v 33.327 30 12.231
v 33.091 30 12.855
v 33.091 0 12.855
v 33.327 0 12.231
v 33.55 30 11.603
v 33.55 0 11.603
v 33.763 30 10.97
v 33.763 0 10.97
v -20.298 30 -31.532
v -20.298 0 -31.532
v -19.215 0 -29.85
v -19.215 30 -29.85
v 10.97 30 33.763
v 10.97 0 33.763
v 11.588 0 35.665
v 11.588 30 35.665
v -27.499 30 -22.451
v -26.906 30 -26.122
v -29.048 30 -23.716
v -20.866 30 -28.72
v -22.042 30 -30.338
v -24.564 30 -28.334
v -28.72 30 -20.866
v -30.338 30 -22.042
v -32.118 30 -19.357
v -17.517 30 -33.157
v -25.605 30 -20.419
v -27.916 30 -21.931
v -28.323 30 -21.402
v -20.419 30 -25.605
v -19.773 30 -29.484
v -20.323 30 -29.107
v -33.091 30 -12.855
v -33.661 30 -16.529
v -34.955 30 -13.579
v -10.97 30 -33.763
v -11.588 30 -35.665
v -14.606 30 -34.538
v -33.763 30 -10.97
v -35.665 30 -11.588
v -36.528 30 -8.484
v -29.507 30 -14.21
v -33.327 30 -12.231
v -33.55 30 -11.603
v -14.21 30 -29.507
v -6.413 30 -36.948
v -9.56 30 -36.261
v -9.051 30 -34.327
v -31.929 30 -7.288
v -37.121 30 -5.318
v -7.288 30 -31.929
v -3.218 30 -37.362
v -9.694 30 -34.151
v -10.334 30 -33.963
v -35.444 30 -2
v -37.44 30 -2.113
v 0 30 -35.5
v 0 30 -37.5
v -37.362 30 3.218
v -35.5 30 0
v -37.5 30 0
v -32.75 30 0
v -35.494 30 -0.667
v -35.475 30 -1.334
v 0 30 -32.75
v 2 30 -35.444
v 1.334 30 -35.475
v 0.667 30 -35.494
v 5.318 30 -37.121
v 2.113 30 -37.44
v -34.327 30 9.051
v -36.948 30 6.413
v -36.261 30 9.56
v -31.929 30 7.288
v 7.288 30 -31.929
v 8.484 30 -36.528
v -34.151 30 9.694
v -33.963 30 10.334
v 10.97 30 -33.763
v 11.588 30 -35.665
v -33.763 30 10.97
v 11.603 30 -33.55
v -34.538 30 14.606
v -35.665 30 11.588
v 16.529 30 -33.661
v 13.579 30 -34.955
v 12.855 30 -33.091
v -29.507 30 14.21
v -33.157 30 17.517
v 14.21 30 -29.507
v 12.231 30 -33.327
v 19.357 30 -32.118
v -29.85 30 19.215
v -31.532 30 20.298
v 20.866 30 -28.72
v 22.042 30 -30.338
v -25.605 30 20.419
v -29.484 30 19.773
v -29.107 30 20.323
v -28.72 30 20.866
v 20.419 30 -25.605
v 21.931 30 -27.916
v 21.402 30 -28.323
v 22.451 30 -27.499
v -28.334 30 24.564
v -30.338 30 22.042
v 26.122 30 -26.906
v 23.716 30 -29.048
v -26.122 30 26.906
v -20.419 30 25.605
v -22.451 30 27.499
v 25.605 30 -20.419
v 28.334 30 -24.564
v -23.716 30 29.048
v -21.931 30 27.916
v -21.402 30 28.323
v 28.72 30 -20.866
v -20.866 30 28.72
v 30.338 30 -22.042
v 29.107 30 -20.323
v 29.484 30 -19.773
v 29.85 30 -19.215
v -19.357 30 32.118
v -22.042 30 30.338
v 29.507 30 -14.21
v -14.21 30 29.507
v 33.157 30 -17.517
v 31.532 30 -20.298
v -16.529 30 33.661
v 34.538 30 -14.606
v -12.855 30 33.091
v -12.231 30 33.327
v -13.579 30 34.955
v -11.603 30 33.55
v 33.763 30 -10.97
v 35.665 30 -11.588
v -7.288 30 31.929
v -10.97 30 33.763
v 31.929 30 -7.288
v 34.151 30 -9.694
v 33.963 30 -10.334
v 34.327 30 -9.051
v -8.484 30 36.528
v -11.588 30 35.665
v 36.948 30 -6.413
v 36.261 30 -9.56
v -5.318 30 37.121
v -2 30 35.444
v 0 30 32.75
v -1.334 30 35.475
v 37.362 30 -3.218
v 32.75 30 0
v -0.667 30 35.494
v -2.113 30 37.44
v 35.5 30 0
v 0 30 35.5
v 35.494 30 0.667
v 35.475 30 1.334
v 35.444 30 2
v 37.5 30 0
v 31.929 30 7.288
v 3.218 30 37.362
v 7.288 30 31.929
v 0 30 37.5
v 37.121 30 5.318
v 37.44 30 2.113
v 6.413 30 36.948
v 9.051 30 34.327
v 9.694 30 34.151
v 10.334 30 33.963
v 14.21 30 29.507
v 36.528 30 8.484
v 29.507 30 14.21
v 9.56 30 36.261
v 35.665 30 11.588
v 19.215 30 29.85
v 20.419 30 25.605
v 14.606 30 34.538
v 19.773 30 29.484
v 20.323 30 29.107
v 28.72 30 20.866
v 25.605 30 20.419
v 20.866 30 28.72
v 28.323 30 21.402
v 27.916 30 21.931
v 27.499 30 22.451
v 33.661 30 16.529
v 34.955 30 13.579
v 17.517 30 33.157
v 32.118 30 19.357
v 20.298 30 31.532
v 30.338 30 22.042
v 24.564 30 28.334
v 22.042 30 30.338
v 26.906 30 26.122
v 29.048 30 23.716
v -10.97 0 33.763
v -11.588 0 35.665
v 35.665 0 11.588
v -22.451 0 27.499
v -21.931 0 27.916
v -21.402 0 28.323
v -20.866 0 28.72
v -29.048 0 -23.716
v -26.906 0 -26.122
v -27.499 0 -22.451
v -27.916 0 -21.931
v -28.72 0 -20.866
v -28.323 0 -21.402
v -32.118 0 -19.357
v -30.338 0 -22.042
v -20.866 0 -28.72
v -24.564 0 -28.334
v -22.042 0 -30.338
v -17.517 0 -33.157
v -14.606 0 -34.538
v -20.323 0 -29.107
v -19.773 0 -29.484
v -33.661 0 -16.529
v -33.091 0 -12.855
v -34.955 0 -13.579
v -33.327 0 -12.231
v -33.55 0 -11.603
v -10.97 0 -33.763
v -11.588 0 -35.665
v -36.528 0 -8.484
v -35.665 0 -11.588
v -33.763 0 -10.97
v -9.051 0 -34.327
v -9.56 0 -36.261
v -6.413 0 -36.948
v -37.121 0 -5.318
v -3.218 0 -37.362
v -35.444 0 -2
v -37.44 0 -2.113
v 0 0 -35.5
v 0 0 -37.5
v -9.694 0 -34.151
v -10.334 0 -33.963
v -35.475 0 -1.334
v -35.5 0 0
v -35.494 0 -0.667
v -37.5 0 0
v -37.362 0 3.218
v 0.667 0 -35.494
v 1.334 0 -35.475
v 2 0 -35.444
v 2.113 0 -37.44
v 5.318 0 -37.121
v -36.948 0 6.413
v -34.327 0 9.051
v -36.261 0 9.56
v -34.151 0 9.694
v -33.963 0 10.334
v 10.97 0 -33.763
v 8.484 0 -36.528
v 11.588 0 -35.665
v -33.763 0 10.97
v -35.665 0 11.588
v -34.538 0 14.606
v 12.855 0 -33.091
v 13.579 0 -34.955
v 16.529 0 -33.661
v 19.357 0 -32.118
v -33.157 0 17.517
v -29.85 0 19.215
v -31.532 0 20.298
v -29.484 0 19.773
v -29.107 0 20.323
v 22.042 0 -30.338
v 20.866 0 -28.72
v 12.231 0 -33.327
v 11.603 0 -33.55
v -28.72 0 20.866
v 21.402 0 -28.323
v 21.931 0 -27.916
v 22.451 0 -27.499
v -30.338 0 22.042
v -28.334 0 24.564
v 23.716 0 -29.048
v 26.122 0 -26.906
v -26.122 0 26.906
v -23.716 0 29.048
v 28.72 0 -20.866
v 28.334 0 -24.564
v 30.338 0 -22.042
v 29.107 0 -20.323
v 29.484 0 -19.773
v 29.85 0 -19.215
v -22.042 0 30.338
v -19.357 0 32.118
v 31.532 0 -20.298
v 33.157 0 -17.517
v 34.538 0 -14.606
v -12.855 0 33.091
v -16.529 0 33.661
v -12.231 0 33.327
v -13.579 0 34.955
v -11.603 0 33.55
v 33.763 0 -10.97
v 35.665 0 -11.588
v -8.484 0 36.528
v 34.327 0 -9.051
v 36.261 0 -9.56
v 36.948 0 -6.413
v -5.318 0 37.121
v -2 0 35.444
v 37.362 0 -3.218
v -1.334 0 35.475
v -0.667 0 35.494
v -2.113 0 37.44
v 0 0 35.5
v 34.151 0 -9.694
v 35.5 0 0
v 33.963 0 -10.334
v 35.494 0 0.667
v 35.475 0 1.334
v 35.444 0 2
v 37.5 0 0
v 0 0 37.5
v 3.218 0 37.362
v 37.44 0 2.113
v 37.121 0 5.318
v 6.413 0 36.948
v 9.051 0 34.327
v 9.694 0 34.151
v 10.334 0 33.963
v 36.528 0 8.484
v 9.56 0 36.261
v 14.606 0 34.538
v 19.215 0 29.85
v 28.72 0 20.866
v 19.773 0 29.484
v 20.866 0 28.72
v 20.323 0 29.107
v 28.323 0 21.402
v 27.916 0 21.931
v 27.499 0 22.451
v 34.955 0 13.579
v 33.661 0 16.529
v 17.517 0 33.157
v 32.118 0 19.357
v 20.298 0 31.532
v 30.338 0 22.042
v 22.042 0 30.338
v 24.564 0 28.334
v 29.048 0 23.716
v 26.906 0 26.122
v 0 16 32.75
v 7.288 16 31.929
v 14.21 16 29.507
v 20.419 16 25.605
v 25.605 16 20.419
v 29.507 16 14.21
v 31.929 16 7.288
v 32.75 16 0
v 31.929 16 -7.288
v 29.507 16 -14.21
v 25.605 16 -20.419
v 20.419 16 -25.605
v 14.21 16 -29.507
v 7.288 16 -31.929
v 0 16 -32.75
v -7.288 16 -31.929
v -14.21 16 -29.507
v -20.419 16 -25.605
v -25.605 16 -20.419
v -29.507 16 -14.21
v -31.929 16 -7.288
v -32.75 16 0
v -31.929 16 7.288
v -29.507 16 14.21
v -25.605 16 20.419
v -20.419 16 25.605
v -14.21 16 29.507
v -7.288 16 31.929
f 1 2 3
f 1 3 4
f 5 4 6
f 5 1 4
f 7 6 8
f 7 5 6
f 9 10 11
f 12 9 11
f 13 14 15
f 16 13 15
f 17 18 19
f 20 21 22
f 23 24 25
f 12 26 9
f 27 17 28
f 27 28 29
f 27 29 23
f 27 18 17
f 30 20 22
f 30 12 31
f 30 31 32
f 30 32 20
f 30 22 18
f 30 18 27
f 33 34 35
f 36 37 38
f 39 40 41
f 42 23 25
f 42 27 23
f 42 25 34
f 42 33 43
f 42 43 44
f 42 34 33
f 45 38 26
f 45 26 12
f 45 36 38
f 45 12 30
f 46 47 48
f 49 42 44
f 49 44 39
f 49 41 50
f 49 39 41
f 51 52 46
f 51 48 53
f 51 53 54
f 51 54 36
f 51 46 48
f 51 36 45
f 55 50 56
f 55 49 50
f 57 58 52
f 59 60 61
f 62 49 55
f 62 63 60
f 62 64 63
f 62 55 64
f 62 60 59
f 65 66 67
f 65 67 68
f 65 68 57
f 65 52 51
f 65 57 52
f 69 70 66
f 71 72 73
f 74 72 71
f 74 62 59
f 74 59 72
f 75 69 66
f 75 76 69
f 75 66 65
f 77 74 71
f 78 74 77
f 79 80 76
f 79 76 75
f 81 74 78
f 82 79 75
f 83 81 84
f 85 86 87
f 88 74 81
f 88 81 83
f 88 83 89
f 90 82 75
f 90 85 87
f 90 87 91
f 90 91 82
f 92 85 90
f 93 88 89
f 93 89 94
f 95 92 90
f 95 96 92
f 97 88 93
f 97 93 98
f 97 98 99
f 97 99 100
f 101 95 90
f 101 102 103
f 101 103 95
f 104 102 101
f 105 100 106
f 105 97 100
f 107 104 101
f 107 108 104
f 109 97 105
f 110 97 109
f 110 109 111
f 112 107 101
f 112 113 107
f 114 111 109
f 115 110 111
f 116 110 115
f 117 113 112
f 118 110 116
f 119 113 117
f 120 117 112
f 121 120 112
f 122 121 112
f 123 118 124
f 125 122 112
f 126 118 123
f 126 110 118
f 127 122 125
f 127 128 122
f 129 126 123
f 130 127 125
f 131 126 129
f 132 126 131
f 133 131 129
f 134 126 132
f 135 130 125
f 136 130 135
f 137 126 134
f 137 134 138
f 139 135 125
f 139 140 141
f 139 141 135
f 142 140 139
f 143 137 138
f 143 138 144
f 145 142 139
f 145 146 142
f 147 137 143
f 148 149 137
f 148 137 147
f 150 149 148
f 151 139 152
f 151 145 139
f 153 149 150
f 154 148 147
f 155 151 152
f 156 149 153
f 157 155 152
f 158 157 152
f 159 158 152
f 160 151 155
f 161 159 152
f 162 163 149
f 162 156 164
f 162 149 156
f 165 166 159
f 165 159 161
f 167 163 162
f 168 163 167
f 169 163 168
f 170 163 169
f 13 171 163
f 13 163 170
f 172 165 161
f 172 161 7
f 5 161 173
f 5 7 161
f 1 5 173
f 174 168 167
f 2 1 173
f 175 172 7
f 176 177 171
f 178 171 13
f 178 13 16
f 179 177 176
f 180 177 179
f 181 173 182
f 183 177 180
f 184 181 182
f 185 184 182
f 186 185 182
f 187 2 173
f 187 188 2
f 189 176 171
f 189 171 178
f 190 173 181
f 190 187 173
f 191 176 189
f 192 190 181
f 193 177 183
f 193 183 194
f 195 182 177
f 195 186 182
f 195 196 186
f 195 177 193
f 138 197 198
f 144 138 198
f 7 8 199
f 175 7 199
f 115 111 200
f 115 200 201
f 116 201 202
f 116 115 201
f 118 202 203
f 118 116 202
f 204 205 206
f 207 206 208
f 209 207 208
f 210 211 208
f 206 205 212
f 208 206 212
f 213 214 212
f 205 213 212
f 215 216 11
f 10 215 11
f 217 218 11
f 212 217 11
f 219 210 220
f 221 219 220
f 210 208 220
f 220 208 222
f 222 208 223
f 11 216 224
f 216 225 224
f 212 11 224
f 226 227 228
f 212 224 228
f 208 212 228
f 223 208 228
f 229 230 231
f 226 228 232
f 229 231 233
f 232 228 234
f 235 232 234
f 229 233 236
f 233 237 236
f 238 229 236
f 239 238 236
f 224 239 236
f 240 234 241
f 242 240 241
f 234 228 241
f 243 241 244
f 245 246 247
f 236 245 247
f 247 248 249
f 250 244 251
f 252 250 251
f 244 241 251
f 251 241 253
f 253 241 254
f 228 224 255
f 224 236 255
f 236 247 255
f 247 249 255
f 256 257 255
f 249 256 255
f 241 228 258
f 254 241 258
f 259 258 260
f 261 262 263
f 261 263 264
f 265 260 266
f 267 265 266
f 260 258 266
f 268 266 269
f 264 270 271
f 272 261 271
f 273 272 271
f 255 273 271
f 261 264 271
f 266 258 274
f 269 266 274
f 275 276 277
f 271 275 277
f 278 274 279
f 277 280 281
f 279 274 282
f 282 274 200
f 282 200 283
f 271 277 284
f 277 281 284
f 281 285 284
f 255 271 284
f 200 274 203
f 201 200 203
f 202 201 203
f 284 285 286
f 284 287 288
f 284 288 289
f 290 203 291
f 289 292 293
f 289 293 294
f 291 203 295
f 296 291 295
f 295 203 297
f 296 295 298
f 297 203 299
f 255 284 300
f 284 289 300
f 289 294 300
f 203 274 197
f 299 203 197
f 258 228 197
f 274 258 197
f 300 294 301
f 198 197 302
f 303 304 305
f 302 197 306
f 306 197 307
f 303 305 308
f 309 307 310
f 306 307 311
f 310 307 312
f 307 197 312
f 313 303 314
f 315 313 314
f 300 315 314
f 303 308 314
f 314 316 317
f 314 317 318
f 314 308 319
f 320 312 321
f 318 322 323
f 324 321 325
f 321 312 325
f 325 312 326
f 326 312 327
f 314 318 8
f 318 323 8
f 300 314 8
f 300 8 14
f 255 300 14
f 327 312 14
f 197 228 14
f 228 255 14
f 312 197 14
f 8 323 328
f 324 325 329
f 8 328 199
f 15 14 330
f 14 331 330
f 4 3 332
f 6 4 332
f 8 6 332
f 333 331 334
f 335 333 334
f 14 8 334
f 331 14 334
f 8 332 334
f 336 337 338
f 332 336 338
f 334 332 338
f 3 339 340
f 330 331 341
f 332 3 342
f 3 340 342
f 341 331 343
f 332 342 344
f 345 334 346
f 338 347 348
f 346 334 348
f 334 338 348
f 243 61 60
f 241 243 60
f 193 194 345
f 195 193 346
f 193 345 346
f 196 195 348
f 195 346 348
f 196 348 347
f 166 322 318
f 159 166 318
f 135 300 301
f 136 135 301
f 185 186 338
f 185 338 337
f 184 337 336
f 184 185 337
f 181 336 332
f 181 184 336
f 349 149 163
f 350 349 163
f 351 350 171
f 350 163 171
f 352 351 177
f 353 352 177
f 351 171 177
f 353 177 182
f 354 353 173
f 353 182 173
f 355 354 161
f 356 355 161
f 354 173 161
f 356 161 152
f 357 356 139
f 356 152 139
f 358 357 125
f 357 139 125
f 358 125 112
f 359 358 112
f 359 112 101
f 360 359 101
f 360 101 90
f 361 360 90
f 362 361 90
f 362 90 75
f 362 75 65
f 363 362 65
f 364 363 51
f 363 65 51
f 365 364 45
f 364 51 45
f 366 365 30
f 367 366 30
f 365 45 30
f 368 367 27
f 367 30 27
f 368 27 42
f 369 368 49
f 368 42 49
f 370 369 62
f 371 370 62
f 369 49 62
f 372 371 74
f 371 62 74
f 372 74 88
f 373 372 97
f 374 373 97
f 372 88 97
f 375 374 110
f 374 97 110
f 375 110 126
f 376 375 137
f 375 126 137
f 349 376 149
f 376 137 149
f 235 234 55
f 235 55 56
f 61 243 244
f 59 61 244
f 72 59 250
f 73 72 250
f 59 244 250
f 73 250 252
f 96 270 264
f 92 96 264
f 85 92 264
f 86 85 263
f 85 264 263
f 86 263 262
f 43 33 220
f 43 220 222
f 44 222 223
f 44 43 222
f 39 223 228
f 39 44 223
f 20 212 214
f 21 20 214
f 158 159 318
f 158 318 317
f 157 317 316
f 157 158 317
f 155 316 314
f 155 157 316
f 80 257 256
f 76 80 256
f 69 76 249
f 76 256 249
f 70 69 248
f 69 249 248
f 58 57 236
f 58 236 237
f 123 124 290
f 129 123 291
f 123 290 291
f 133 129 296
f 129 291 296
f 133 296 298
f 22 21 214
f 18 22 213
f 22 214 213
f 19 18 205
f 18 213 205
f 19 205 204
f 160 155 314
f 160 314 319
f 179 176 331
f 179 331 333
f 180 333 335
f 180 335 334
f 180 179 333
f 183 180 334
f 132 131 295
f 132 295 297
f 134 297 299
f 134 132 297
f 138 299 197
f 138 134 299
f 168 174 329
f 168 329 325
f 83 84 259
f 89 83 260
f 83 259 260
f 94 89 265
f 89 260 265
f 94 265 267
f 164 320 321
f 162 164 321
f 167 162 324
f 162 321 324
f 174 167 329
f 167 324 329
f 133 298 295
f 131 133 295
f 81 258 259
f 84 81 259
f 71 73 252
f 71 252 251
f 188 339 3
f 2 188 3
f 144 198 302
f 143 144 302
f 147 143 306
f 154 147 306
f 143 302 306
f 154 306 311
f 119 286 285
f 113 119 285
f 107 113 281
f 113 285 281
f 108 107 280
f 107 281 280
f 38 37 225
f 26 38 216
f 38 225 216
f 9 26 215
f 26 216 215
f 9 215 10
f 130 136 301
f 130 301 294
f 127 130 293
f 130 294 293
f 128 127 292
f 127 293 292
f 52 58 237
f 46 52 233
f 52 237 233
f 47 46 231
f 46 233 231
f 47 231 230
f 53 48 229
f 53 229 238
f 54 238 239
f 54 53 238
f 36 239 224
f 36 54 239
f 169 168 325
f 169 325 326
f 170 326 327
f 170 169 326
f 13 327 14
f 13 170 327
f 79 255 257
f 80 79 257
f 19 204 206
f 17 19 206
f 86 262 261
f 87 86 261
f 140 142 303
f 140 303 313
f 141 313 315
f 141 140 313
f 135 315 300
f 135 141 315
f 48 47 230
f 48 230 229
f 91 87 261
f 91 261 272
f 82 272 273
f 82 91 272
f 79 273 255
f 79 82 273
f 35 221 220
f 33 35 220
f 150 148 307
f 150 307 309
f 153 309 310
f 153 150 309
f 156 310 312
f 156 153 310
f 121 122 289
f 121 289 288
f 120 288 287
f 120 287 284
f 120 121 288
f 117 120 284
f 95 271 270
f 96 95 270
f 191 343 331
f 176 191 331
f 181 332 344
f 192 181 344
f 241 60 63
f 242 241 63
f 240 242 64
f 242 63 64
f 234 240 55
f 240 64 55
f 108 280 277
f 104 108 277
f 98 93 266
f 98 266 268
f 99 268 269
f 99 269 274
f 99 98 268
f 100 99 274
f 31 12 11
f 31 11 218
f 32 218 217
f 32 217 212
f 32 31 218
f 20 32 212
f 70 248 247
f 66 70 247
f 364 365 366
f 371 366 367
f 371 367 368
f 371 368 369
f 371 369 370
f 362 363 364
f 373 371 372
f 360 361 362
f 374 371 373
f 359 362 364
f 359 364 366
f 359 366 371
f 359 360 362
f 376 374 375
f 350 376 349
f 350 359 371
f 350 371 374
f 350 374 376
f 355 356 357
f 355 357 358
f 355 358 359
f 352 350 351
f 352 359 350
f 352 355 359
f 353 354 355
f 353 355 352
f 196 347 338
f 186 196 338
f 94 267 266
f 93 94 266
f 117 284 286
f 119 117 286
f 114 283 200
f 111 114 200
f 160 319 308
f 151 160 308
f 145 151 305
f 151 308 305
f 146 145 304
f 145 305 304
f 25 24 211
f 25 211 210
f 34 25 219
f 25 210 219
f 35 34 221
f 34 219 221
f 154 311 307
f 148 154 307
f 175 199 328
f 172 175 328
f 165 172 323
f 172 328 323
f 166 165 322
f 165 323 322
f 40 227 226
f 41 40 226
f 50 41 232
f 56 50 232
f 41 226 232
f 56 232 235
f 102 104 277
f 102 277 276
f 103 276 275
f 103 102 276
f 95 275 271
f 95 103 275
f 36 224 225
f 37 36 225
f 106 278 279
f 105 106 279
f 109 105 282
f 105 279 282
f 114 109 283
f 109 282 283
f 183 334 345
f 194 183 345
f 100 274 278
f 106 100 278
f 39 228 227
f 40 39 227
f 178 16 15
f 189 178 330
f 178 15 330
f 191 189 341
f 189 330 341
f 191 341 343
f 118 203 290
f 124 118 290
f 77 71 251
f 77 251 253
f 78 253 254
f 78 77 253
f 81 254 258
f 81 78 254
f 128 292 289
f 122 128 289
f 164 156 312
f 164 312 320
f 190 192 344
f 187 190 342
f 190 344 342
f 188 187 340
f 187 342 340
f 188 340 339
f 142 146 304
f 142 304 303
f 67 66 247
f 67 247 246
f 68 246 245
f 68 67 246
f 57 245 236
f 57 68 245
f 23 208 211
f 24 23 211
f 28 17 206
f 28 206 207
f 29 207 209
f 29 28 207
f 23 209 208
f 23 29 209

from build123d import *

# Parameters (mm, degrees)
SKETCH_1_R          = 37.5
EXTRUDE_1_DEPTH     = 30
SKETCH_2_R          = 32.75
CUT_EXTRUDE_1_DEPTH = 14
CUT_EXTRUDE_2_DEPTH = 61.930288035


with BuildPart() as part:
    # 草图1 → 凸台-拉伸1 (new body)
    with BuildSketch(Plane(origin=(0, 0, 0), x_dir=(1, 0, 0), z_dir=(0, 1, 0))):
        with Locations(Location((0, 0, 0), (0, 0, 270))):
            Circle(SKETCH_1_R)
    extrude(amount=EXTRUDE_1_DEPTH)

    # 草图2 → 切除-拉伸1 (cut)
    with BuildSketch(Plane(origin=(0, 30, 0), x_dir=(1, 0, 0), z_dir=(0, 1, 0))):
        with Locations(Location((0, 0, 0), (0, 0, 270))):
            Circle(SKETCH_2_R)
    extrude(amount=-CUT_EXTRUDE_1_DEPTH, mode=Mode.SUBTRACT)

    # 草图3 → 切除-拉伸2 (cut, through all)
    with BuildSketch(Plane(origin=(0, 30, 0), x_dir=(1, 0, 0), z_dir=(0, 1, 0))):
        with BuildLine():
            Line((-35.443617197, 2), (-37.440440701, 2.112676056))
            ThreePointArc((-37.440440701, 2.112676056), (-37.485107218, 1.05675771), (-37.5, 0))
            Line((-37.5, 0), (-35.5, 0))
            ThreePointArc((-35.5, 0), (-35.4859015, 1.000397299), (-35.443617197, 2))
        make_face()
        with BuildLine():
            Line((-33.762506328, 10.9701033), (-35.664619361, 11.588137289))
            ThreePointArc((-35.664619361, 11.588137289), (-35.323899392, 12.588571472), (-34.955122297, 13.579006784))
            Line((-34.955122297, 13.579006784), (-33.090849107, 12.854793089))
            ThreePointArc((-33.090849107, 12.854793089), (-33.439958091, 11.917180994), (-33.762506328, 10.9701033))
        make_face()
        with BuildLine():
            Line((-28.7201033, 20.866376456), (-30.338137289, 22.041946961))
            ThreePointArc((-30.338137289, 22.041946961), (-29.704942178, 22.88812815), (-29.048152975, 23.716129717))
            Line((-29.048152975, 23.716129717), (-27.49891815, 22.451269465))
            ThreePointArc((-27.49891815, 22.451269465), (-28.120678595, 21.667427982), (-28.7201033, 20.866376456))
        make_face()
        with BuildLine():
            Line((-20.866376456, 28.7201033), (-22.041946961, 30.338137289))
            ThreePointArc((-22.041946961, 30.338137289), (-21.178258257, 30.947235372), (-20.29774805, 31.531752633))
            Line((-20.29774805, 31.531752633), (-19.215201487, 29.850059159))
            ThreePointArc((-19.215201487, 29.850059159), (-20.04875115, 29.296716153), (-20.866376456, 28.7201033))
        make_face()
        with BuildLine():
            Line((-10.9701033, 33.762506328), (-11.588137289, 35.664619361))
            ThreePointArc((-11.588137289, 35.664619361), (-10.57849886, 35.977011575), (-9.560458123, 36.260827907))
            Line((-9.560458123, 36.260827907), (-9.050567023, 34.326917085))
            ThreePointArc((-9.050567023, 34.326917085), (-10.014312254, 34.058237624), (-10.9701033, 33.762506328))
        make_face()
        with BuildLine():
            Line((0, 35.5), (0, 37.5))
            ThreePointArc((0, 37.5), (1.05675771, 37.485107218), (2.112676056, 37.440440701))
            Line((2.112676056, 37.440440701), (2, 35.443617197))
            ThreePointArc((2, 35.443617197), (1.000397299, 35.4859015), (0, 35.5))
        make_face()
        with BuildLine():
            Line((10.9701033, 33.762506328), (11.588137289, 35.664619361))
            ThreePointArc((11.588137289, 35.664619361), (12.588571472, 35.323899392), (13.579006784, 34.955122297))
            Line((13.579006784, 34.955122297), (12.854793089, 33.090849107))
            ThreePointArc((12.854793089, 33.090849107), (11.917180994, 33.439958091), (10.9701033, 33.762506328))
        make_face()
        with BuildLine():
            Line((20.866376456, 28.7201033), (22.041946961, 30.338137289))
            ThreePointArc((22.041946961, 30.338137289), (22.88812815, 29.704942178), (23.716129717, 29.048152975))
            Line((23.716129717, 29.048152975), (22.451269465, 27.49891815))
            ThreePointArc((22.451269465, 27.49891815), (21.667427982, 28.120678595), (20.866376456, 28.7201033))
        make_face()
        with BuildLine():
            Line((28.7201033, 20.866376456), (30.338137289, 22.041946961))
            ThreePointArc((30.338137289, 22.041946961), (30.947235372, 21.178258257), (31.531752633, 20.29774805))
            Line((31.531752633, 20.29774805), (29.850059159, 19.215201487))
            ThreePointArc((29.850059159, 19.215201487), (29.296716153, 20.04875115), (28.7201033, 20.866376456))
        make_face()
        with BuildLine():
            Line((33.762506328, 10.9701033), (35.664619361, 11.588137289))
            ThreePointArc((35.664619361, 11.588137289), (35.977011575, 10.57849886), (36.260827907, 9.560458123))
            Line((36.260827907, 9.560458123), (34.326917085, 9.050567023))
            ThreePointArc((34.326917085, 9.050567023), (34.058237624, 10.014312254), (33.762506328, 10.9701033))
        make_face()
        with BuildLine():
            Line((35.5, 0), (37.5, 0))
            ThreePointArc((37.5, 0), (37.485107218, -1.05675771), (37.440440701, -2.112676056))
            Line((37.440440701, -2.112676056), (35.443617197, -2))
            ThreePointArc((35.443617197, -2), (35.4859015, -1.000397299), (35.5, 0))
        make_face()
        with BuildLine():
            Line((33.762506328, -10.9701033), (35.664619361, -11.588137289))
            ThreePointArc((35.664619361, -11.588137289), (35.323899392, -12.588571472), (34.955122297, -13.579006784))
            Line((34.955122297, -13.579006784), (33.090849107, -12.854793089))
            ThreePointArc((33.090849107, -12.854793089), (33.439958091, -11.917180994), (33.762506328, -10.9701033))
        make_face()
        with BuildLine():
            Line((28.7201033, -20.866376456), (30.338137289, -22.041946961))
            ThreePointArc((30.338137289, -22.041946961), (29.704942178, -22.88812815), (29.048152975, -23.716129717))
            Line((29.048152975, -23.716129717), (27.49891815, -22.451269465))
            ThreePointArc((27.49891815, -22.451269465), (28.120678595, -21.667427982), (28.7201033, -20.866376456))
        make_face()
        with BuildLine():
            Line((20.866376456, -28.7201033), (22.041946961, -30.338137289))
            ThreePointArc((22.041946961, -30.338137289), (21.178258257, -30.947235372), (20.29774805, -31.531752633))
            Line((20.29774805, -31.531752633), (19.215201487, -29.850059159))
            ThreePointArc((19.215201487, -29.850059159), (20.04875115, -29.296716153), (20.866376456, -28.7201033))
        make_face()
        with BuildLine():
            Line((10.9701033, -33.762506328), (11.588137289, -35.664619361))
            ThreePointArc((11.588137289, -35.664619361), (10.57849886, -35.977011575), (9.560458123, -36.260827907))
            Line((9.560458123, -36.260827907), (9.050567023, -34.326917085))
            ThreePointArc((9.050567023, -34.326917085), (10.014312254, -34.058237624), (10.9701033, -33.762506328))
        make_face()
        with BuildLine():
            Line((0, -35.5), (0, -37.5))
            ThreePointArc((0, -37.5), (-1.05675771, -37.485107218), (-2.112676056, -37.440440701))
            Line((-2.112676056, -37.440440701), (-2, -35.443617197))
            ThreePointArc((-2, -35.443617197), (-1.000397299, -35.4859015), (0, -35.5))
        make_face()
        with BuildLine():
            Line((-10.9701033, -33.762506328), (-11.588137289, -35.664619361))
            ThreePointArc((-11.588137289, -35.664619361), (-12.588571472, -35.323899392), (-13.579006784, -34.955122297))
            Line((-13.579006784, -34.955122297), (-12.854793089, -33.090849107))
            ThreePointArc((-12.854793089, -33.090849107), (-11.917180994, -33.439958091), (-10.9701033, -33.762506328))
        make_face()
        with BuildLine():
            Line((-20.866376456, -28.7201033), (-22.041946961, -30.338137289))
            ThreePointArc((-22.041946961, -30.338137289), (-22.88812815, -29.704942178), (-23.716129717, -29.048152975))
            Line((-23.716129717, -29.048152975), (-22.451269465, -27.49891815))
            ThreePointArc((-22.451269465, -27.49891815), (-21.667427982, -28.120678595), (-20.866376456, -28.7201033))
        make_face()
        with BuildLine():
            Line((-28.7201033, -20.866376456), (-30.338137289, -22.041946961))
            ThreePointArc((-30.338137289, -22.041946961), (-30.947235372, -21.178258257), (-31.531752633, -20.29774805))
            Line((-31.531752633, -20.29774805), (-29.850059159, -19.215201487))
            ThreePointArc((-29.850059159, -19.215201487), (-29.296716153, -20.04875115), (-28.7201033, -20.866376456))
        make_face()
        with BuildLine():
            Line((-33.762506328, -10.9701033), (-35.664619361, -11.588137289))
            ThreePointArc((-35.664619361, -11.588137289), (-35.977011575, -10.57849886), (-36.260827907, -9.560458123))
            Line((-36.260827907, -9.560458123), (-34.326917085, -9.050567023))
            ThreePointArc((-34.326917085, -9.050567023), (-34.058237624, -10.014312254), (-33.762506328, -10.9701033))
        make_face()
    extrude(amount=-CUT_EXTRUDE_2_DEPTH, mode=Mode.SUBTRACT)


solid = part.part
